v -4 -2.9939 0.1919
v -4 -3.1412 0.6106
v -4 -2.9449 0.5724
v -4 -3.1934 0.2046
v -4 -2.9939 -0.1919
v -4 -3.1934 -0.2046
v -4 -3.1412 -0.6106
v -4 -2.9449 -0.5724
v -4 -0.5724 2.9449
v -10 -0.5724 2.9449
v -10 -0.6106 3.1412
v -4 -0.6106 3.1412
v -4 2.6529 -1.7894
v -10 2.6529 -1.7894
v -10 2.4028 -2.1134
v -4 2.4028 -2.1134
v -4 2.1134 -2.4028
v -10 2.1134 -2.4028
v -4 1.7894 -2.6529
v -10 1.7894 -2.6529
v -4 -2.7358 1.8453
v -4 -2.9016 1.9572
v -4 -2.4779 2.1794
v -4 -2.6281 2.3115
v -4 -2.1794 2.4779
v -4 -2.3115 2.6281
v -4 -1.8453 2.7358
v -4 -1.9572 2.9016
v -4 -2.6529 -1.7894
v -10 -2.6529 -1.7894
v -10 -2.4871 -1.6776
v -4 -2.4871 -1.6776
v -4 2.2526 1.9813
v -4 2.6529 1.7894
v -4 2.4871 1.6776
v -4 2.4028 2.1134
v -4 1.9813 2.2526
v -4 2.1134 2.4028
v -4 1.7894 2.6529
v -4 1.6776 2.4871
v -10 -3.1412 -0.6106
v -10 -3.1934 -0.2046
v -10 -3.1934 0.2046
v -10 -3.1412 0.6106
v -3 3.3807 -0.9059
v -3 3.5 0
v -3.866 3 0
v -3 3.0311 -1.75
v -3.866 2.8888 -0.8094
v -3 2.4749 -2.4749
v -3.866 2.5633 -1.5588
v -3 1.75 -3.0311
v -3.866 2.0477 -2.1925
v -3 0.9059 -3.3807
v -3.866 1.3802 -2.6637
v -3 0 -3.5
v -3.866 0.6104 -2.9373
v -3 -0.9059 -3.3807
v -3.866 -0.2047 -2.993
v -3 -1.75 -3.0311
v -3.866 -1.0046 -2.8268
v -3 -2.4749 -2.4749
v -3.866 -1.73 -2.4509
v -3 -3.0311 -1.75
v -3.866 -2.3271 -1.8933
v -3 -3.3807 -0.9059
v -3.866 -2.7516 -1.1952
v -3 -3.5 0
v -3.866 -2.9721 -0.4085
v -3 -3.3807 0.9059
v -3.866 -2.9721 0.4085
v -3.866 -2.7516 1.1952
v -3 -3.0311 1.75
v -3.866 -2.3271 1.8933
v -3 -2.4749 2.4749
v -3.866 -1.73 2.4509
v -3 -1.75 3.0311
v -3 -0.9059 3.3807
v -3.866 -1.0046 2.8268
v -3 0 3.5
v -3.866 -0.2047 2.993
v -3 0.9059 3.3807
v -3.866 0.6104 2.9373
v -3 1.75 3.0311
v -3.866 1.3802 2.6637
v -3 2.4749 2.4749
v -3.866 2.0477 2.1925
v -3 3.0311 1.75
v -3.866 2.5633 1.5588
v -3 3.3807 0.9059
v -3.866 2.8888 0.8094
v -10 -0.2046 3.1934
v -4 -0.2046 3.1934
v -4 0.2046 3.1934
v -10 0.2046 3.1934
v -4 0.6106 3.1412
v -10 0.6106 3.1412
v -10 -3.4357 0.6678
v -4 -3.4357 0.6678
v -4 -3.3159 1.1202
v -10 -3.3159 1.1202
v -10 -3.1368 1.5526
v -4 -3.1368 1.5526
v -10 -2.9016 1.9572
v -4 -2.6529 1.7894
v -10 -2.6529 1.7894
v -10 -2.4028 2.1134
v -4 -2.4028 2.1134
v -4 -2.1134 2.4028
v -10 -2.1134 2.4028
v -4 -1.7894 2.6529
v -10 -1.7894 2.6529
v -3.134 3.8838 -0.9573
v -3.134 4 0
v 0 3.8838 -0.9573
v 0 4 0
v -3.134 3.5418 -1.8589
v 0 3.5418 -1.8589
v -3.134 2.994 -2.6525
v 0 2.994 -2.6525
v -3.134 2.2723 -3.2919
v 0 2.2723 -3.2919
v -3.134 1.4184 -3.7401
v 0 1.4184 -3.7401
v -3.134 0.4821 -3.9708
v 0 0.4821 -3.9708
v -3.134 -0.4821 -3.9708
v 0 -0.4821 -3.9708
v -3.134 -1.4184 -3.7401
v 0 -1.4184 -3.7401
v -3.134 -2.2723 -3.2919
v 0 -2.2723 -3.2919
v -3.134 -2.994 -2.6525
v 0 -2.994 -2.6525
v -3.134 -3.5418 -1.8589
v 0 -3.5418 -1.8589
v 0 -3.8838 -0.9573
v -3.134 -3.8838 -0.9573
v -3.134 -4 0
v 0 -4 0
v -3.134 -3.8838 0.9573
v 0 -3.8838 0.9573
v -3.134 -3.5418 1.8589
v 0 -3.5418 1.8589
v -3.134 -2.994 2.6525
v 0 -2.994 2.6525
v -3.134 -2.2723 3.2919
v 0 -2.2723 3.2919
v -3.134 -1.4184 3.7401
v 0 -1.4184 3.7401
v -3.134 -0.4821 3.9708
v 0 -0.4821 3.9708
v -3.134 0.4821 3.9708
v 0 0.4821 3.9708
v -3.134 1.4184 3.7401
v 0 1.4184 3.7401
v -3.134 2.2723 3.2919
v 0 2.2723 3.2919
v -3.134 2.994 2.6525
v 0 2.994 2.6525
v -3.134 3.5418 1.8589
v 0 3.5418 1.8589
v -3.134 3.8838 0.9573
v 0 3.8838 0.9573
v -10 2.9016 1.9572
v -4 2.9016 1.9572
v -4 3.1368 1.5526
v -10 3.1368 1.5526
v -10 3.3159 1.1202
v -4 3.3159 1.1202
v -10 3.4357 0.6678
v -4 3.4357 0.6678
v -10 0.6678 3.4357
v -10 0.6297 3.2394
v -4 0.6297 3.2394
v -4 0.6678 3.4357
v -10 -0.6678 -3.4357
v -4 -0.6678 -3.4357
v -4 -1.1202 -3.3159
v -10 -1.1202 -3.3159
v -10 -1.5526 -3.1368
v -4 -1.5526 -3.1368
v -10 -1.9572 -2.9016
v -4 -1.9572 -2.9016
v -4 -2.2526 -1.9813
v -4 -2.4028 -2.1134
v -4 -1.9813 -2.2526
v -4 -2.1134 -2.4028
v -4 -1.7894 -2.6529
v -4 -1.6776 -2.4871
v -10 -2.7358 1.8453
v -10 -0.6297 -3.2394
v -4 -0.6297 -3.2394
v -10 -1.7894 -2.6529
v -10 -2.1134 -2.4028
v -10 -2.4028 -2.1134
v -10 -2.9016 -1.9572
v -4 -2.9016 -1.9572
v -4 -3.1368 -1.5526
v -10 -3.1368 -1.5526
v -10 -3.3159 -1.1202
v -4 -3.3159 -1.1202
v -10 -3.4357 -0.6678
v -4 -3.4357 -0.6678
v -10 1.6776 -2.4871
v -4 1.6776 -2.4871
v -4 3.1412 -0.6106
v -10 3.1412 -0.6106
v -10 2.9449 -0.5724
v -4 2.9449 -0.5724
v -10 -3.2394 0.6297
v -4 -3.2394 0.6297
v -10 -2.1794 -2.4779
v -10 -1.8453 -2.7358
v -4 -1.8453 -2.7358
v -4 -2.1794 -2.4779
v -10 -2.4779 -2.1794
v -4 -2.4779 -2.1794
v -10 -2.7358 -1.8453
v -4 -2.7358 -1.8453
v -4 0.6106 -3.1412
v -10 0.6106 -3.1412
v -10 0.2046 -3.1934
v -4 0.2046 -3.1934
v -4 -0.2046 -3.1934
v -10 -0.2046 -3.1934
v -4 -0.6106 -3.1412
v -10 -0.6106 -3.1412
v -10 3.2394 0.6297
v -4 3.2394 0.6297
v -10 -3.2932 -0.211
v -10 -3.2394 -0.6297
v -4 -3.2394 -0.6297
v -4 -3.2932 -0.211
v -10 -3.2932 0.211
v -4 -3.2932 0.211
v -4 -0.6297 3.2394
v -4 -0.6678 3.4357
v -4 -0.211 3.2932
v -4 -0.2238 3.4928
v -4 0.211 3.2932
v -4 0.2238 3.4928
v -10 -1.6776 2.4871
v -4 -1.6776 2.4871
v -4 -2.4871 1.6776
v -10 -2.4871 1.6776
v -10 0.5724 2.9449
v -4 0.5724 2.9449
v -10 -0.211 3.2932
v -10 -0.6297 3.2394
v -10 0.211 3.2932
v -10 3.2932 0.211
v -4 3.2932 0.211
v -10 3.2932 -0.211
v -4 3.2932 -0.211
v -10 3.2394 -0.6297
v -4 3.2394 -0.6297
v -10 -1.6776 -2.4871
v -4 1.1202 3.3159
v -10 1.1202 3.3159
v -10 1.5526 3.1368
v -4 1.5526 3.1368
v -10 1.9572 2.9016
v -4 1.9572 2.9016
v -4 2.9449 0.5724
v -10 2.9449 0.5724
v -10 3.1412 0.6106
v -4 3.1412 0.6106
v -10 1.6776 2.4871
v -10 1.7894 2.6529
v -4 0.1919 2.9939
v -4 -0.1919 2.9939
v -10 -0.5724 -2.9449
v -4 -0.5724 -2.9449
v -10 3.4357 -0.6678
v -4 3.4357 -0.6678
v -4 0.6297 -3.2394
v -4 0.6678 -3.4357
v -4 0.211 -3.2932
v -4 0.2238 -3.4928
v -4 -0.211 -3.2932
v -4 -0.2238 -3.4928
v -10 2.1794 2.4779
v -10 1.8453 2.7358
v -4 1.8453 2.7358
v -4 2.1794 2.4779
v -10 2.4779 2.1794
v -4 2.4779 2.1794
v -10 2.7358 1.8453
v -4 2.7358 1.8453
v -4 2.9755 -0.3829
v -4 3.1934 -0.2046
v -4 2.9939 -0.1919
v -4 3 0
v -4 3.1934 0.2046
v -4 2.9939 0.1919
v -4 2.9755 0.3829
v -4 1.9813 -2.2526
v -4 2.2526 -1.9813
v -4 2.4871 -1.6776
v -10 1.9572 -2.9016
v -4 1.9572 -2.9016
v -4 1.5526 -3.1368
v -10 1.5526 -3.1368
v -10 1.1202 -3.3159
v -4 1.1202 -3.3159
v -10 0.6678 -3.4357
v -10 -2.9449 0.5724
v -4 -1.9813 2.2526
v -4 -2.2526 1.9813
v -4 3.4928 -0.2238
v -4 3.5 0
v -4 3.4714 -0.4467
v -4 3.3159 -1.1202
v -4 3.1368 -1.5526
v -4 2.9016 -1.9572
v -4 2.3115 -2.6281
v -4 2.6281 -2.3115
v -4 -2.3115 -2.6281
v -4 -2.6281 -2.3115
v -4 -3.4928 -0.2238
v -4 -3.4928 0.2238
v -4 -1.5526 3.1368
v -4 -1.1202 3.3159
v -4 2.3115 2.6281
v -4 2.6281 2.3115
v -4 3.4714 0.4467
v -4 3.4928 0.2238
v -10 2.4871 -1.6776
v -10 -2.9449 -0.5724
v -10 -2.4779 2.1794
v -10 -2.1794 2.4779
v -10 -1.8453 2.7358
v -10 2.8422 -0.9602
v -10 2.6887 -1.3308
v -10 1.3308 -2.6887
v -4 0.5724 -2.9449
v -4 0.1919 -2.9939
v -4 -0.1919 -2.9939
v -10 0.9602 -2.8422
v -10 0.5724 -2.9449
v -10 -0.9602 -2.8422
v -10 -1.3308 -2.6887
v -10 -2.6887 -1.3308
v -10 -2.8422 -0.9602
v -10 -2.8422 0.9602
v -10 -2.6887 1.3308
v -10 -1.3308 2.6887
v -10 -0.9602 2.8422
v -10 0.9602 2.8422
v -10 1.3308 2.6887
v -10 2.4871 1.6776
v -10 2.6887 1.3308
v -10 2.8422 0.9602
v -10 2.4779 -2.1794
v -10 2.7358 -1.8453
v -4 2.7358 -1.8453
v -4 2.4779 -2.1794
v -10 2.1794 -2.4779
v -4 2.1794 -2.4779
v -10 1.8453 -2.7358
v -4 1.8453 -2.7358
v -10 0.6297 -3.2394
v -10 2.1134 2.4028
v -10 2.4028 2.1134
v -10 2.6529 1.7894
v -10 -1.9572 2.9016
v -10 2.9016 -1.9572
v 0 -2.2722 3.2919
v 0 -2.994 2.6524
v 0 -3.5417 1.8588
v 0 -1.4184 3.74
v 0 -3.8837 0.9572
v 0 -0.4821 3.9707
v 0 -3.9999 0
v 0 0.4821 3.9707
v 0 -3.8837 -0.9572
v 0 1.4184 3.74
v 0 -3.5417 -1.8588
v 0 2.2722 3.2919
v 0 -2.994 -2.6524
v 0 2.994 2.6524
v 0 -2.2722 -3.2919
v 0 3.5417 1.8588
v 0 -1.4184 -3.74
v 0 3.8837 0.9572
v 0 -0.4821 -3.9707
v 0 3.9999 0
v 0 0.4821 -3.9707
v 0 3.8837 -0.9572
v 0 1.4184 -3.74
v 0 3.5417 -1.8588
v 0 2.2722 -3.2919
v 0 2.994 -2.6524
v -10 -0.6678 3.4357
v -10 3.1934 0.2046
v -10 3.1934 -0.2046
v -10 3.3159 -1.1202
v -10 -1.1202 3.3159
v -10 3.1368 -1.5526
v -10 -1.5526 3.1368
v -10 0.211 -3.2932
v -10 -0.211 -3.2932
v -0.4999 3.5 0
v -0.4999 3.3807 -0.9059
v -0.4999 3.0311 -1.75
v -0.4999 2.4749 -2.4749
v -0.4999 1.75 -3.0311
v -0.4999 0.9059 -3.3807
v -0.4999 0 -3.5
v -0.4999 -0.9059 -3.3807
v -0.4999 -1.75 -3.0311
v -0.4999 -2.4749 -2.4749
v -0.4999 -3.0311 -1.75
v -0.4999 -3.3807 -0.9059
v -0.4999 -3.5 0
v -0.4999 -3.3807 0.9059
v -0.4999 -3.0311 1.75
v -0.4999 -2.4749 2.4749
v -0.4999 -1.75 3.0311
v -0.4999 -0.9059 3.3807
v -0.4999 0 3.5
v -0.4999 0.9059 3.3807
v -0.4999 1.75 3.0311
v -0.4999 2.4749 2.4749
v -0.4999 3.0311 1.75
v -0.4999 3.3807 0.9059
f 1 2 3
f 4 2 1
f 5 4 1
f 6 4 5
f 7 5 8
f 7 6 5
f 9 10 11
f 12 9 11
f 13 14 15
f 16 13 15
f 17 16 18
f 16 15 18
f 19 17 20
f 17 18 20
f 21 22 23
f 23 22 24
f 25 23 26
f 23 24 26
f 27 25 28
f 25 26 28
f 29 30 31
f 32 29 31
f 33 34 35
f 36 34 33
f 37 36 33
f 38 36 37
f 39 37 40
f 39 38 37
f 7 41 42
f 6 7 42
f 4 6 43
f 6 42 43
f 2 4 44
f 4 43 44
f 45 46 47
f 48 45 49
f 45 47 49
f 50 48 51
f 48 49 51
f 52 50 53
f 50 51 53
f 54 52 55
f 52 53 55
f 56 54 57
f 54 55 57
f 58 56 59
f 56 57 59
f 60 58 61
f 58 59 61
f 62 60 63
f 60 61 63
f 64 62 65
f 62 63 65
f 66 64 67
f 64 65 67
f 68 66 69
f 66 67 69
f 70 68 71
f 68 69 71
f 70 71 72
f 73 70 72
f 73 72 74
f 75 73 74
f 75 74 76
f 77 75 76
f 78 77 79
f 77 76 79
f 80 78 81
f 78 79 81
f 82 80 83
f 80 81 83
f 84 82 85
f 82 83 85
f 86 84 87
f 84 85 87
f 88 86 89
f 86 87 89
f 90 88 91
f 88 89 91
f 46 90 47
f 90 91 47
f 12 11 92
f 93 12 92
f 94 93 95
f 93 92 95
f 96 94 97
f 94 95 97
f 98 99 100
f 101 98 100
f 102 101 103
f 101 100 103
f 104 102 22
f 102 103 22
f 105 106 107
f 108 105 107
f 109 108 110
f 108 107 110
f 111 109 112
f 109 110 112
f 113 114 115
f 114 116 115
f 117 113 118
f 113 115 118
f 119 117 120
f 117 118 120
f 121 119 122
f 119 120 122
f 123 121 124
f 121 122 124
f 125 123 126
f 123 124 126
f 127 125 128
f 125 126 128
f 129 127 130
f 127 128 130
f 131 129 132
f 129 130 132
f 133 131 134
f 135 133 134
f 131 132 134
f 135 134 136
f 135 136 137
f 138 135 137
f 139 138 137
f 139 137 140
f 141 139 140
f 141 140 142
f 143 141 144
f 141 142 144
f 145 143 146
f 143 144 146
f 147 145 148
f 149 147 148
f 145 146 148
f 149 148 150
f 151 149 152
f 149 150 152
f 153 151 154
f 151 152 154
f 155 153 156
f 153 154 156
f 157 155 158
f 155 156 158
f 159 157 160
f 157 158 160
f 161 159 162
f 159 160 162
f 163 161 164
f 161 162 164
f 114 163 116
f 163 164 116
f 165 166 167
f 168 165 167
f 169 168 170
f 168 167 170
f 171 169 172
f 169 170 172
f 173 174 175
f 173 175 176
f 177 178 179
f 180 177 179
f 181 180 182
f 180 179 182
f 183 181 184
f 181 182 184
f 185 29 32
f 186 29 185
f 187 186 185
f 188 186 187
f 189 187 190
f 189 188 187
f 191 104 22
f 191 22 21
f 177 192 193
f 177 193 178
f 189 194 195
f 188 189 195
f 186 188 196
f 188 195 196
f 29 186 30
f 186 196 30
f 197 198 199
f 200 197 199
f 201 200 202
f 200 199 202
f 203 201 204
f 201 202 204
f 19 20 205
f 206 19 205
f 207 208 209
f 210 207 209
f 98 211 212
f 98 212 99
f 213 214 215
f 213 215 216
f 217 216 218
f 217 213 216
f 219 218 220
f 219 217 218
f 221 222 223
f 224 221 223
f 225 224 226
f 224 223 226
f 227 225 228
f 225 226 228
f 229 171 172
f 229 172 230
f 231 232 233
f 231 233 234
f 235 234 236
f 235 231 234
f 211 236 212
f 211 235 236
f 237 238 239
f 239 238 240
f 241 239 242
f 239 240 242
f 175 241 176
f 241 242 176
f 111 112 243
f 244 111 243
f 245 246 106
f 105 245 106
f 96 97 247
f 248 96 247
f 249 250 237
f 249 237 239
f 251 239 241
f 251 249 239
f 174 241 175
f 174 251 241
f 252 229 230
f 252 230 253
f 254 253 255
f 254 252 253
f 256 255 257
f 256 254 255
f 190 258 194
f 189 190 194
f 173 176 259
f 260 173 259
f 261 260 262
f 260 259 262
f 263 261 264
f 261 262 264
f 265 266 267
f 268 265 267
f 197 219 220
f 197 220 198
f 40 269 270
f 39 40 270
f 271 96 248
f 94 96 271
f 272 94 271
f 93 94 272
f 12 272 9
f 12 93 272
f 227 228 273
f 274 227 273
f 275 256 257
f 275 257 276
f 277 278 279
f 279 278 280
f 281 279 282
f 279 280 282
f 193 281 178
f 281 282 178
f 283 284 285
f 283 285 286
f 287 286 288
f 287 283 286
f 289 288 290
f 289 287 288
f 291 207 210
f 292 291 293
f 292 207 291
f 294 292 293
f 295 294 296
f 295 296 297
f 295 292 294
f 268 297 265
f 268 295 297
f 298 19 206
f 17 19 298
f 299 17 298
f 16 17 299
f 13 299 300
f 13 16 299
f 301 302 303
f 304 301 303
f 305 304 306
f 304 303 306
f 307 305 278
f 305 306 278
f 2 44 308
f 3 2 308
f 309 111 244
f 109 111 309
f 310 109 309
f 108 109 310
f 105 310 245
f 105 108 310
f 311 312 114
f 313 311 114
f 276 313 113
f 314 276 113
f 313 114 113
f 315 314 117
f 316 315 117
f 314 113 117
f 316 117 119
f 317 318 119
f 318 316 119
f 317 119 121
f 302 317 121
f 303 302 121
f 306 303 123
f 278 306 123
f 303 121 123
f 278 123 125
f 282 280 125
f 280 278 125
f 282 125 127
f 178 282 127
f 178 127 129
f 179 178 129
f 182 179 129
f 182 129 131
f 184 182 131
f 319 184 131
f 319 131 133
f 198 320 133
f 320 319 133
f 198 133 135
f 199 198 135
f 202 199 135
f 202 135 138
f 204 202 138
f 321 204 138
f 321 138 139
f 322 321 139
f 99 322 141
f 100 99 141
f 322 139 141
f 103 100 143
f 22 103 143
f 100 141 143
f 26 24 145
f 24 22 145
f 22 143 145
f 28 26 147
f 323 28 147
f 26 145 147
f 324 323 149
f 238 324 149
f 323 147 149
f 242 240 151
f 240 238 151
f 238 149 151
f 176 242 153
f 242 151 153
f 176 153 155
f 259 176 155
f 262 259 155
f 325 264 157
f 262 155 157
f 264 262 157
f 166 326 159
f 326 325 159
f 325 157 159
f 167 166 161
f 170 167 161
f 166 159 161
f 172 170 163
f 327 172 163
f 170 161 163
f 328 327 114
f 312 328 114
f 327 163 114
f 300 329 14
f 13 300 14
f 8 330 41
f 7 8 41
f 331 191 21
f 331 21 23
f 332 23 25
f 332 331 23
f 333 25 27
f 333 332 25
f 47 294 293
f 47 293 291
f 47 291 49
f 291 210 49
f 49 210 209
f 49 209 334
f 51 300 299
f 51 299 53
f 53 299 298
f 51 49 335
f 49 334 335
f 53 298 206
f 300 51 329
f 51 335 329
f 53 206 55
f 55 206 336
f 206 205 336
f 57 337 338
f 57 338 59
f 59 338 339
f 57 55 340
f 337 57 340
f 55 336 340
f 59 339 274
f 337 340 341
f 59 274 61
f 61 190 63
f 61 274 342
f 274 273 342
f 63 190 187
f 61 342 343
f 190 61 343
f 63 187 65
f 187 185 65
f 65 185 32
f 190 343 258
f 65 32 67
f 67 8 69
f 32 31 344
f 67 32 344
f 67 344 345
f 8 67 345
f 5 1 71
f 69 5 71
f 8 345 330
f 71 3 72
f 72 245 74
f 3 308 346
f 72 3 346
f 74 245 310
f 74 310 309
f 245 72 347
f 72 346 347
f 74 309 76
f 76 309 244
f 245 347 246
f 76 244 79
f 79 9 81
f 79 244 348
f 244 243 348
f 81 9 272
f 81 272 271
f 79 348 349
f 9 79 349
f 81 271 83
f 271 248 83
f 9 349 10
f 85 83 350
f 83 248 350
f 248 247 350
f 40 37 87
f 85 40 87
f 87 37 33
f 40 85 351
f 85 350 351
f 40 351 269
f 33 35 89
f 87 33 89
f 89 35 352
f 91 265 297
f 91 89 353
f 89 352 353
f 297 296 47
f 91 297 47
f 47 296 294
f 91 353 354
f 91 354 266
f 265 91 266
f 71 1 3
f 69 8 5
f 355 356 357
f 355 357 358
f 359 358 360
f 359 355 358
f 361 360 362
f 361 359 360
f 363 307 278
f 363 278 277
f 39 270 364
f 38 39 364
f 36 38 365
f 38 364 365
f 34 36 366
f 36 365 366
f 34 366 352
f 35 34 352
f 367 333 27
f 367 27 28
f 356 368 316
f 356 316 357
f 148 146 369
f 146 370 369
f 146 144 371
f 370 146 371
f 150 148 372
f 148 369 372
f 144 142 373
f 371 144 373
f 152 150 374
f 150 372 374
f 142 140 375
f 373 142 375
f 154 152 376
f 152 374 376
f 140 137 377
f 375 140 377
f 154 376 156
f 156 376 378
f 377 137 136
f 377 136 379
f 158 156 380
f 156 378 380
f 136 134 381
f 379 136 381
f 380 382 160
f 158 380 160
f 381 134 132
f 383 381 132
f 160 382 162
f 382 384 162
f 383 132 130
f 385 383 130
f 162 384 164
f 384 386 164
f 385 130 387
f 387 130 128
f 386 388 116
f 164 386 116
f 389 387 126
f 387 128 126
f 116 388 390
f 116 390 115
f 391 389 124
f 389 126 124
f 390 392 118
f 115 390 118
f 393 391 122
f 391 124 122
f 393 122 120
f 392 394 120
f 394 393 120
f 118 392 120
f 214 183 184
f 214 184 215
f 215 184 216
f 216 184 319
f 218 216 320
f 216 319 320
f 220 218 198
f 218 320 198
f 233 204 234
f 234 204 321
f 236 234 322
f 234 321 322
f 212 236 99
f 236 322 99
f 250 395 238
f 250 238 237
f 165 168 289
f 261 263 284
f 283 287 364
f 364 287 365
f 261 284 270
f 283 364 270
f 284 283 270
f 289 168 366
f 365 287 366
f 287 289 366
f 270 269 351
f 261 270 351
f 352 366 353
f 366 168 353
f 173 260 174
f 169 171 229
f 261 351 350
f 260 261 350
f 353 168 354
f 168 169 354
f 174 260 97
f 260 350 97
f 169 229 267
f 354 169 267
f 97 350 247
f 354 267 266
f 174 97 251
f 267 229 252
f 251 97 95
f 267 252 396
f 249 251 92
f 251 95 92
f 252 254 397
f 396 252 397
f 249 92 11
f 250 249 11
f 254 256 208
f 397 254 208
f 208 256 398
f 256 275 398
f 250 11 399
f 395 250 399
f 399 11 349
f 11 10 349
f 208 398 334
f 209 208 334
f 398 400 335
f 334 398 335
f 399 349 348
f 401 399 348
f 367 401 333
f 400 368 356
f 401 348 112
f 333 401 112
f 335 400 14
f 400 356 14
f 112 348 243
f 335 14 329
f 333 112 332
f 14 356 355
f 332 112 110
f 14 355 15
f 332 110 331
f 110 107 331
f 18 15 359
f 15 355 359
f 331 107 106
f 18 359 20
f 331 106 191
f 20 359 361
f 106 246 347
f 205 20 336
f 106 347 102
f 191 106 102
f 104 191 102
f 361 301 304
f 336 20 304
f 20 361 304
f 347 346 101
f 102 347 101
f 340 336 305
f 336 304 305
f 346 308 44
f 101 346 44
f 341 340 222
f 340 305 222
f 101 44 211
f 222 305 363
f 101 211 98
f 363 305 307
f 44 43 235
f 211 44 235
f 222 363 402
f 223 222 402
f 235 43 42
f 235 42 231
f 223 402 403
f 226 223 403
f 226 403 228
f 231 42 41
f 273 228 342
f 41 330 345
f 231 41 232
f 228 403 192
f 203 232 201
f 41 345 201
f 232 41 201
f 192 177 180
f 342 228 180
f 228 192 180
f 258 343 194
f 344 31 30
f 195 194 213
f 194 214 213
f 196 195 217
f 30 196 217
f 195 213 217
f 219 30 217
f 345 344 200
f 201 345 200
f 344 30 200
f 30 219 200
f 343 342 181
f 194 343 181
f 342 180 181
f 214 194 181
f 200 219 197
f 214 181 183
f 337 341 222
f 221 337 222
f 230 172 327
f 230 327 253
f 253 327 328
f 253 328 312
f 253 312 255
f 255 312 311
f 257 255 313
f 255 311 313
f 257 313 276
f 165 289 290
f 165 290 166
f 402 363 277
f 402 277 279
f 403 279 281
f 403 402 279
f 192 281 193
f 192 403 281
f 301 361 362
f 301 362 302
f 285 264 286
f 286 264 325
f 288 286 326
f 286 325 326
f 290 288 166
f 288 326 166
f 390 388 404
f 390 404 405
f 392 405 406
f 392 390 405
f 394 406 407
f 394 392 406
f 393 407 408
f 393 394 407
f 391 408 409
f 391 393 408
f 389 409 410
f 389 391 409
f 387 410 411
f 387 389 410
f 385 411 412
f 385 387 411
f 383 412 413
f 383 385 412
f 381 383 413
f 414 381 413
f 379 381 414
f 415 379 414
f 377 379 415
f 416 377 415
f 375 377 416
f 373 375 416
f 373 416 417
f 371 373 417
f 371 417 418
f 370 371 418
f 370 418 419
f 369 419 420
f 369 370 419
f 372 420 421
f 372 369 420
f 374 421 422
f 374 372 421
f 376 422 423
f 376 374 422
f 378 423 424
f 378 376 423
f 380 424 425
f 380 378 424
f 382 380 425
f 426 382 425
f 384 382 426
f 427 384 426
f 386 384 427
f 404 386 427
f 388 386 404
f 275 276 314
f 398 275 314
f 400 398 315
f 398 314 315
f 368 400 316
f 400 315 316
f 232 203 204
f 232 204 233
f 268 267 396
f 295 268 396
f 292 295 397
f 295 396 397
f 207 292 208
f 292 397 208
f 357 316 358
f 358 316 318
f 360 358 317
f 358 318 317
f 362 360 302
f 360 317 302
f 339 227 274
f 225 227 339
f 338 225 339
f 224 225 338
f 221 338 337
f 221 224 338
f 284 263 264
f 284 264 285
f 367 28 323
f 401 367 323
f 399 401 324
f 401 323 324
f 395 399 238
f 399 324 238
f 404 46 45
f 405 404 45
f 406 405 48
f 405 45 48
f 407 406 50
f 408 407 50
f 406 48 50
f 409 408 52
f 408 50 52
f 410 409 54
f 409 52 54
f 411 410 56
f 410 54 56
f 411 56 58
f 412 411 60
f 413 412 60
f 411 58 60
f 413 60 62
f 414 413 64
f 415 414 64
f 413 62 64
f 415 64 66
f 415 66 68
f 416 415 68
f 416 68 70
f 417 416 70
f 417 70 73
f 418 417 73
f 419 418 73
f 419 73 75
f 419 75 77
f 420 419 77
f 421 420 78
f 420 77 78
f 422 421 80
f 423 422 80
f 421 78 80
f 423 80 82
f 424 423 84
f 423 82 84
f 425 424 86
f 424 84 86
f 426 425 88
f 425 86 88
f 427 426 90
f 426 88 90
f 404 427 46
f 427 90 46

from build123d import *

# Parameters (mm, degrees)
CUT_EXTRUDE1_DEPTH = 6
CIRPATTERN1_COUNT  = 8
CHAMFER1_SIZE      = 0.5


with BuildPart() as part:
    # Sketch2 → Revolve1 (revolve)
    with BuildSketch(Plane.XY):
        Polygon((-10, 3), (-10, 3.5), (-4, 3.5), (-3.133974596, 4), (0, 4), (0, 3.5), (-3, 3.5), (-3.866025404, 3), align=None)
    revolve(axis=Axis((-10, 0, 0), (-1, 0, 0)))

    # Sketch3 → Cut-Extrude1 (cut)
    with BuildSketch(Plane.ZY.offset(10)):
        with BuildLine():
            Line((0.572426986, 2.94488155), (0.610588785, 3.141206987))
            ThreePointArc((0.610588785, 3.141206987), (0, 3.2), (-0.610588785, 3.141206987))
            Line((-0.610588785, 3.141206987), (-0.572426986, 2.94488155))
            ThreePointArc((-0.572426986, 2.94488155), (0, 3), (0.572426986, 2.94488155))
        make_face()
        with BuildLine():
            Line((-0.629669685, 3.239369705), (-0.667831484, 3.435695142))
            ThreePointArc((-0.667831484, 3.435695142), (0, 3.5), (0.667831484, 3.435695142))
            Line((0.667831484, 3.435695142), (0.629669685, 3.239369705))
            ThreePointArc((0.629669685, 3.239369705), (0, 3.3), (-0.629669685, 3.239369705))
        make_face()
    cut_extrude1 = extrude(amount=-CUT_EXTRUDE1_DEPTH, mode=Mode.SUBTRACT)

    # CirPattern1: Cut-Extrude1 ×8 about axis
    cirpattern1_axis = Axis((0, 0, 0), (1, 0, 0))
    for i in range(1, CIRPATTERN1_COUNT):
        add(cut_extrude1.rotate(cirpattern1_axis, i * 360 / CIRPATTERN1_COUNT), mode=Mode.SUBTRACT)

    # Chamfer1
    chamfer1_edges = [part.edges().sort_by_distance(p)[0] for p in [
        (0, -3.5, 0),
    ]]
    chamfer(chamfer1_edges, length=CHAMFER1_SIZE - 0.0001)  # a hair under: the kernel refuses the full size


solid = part.part
